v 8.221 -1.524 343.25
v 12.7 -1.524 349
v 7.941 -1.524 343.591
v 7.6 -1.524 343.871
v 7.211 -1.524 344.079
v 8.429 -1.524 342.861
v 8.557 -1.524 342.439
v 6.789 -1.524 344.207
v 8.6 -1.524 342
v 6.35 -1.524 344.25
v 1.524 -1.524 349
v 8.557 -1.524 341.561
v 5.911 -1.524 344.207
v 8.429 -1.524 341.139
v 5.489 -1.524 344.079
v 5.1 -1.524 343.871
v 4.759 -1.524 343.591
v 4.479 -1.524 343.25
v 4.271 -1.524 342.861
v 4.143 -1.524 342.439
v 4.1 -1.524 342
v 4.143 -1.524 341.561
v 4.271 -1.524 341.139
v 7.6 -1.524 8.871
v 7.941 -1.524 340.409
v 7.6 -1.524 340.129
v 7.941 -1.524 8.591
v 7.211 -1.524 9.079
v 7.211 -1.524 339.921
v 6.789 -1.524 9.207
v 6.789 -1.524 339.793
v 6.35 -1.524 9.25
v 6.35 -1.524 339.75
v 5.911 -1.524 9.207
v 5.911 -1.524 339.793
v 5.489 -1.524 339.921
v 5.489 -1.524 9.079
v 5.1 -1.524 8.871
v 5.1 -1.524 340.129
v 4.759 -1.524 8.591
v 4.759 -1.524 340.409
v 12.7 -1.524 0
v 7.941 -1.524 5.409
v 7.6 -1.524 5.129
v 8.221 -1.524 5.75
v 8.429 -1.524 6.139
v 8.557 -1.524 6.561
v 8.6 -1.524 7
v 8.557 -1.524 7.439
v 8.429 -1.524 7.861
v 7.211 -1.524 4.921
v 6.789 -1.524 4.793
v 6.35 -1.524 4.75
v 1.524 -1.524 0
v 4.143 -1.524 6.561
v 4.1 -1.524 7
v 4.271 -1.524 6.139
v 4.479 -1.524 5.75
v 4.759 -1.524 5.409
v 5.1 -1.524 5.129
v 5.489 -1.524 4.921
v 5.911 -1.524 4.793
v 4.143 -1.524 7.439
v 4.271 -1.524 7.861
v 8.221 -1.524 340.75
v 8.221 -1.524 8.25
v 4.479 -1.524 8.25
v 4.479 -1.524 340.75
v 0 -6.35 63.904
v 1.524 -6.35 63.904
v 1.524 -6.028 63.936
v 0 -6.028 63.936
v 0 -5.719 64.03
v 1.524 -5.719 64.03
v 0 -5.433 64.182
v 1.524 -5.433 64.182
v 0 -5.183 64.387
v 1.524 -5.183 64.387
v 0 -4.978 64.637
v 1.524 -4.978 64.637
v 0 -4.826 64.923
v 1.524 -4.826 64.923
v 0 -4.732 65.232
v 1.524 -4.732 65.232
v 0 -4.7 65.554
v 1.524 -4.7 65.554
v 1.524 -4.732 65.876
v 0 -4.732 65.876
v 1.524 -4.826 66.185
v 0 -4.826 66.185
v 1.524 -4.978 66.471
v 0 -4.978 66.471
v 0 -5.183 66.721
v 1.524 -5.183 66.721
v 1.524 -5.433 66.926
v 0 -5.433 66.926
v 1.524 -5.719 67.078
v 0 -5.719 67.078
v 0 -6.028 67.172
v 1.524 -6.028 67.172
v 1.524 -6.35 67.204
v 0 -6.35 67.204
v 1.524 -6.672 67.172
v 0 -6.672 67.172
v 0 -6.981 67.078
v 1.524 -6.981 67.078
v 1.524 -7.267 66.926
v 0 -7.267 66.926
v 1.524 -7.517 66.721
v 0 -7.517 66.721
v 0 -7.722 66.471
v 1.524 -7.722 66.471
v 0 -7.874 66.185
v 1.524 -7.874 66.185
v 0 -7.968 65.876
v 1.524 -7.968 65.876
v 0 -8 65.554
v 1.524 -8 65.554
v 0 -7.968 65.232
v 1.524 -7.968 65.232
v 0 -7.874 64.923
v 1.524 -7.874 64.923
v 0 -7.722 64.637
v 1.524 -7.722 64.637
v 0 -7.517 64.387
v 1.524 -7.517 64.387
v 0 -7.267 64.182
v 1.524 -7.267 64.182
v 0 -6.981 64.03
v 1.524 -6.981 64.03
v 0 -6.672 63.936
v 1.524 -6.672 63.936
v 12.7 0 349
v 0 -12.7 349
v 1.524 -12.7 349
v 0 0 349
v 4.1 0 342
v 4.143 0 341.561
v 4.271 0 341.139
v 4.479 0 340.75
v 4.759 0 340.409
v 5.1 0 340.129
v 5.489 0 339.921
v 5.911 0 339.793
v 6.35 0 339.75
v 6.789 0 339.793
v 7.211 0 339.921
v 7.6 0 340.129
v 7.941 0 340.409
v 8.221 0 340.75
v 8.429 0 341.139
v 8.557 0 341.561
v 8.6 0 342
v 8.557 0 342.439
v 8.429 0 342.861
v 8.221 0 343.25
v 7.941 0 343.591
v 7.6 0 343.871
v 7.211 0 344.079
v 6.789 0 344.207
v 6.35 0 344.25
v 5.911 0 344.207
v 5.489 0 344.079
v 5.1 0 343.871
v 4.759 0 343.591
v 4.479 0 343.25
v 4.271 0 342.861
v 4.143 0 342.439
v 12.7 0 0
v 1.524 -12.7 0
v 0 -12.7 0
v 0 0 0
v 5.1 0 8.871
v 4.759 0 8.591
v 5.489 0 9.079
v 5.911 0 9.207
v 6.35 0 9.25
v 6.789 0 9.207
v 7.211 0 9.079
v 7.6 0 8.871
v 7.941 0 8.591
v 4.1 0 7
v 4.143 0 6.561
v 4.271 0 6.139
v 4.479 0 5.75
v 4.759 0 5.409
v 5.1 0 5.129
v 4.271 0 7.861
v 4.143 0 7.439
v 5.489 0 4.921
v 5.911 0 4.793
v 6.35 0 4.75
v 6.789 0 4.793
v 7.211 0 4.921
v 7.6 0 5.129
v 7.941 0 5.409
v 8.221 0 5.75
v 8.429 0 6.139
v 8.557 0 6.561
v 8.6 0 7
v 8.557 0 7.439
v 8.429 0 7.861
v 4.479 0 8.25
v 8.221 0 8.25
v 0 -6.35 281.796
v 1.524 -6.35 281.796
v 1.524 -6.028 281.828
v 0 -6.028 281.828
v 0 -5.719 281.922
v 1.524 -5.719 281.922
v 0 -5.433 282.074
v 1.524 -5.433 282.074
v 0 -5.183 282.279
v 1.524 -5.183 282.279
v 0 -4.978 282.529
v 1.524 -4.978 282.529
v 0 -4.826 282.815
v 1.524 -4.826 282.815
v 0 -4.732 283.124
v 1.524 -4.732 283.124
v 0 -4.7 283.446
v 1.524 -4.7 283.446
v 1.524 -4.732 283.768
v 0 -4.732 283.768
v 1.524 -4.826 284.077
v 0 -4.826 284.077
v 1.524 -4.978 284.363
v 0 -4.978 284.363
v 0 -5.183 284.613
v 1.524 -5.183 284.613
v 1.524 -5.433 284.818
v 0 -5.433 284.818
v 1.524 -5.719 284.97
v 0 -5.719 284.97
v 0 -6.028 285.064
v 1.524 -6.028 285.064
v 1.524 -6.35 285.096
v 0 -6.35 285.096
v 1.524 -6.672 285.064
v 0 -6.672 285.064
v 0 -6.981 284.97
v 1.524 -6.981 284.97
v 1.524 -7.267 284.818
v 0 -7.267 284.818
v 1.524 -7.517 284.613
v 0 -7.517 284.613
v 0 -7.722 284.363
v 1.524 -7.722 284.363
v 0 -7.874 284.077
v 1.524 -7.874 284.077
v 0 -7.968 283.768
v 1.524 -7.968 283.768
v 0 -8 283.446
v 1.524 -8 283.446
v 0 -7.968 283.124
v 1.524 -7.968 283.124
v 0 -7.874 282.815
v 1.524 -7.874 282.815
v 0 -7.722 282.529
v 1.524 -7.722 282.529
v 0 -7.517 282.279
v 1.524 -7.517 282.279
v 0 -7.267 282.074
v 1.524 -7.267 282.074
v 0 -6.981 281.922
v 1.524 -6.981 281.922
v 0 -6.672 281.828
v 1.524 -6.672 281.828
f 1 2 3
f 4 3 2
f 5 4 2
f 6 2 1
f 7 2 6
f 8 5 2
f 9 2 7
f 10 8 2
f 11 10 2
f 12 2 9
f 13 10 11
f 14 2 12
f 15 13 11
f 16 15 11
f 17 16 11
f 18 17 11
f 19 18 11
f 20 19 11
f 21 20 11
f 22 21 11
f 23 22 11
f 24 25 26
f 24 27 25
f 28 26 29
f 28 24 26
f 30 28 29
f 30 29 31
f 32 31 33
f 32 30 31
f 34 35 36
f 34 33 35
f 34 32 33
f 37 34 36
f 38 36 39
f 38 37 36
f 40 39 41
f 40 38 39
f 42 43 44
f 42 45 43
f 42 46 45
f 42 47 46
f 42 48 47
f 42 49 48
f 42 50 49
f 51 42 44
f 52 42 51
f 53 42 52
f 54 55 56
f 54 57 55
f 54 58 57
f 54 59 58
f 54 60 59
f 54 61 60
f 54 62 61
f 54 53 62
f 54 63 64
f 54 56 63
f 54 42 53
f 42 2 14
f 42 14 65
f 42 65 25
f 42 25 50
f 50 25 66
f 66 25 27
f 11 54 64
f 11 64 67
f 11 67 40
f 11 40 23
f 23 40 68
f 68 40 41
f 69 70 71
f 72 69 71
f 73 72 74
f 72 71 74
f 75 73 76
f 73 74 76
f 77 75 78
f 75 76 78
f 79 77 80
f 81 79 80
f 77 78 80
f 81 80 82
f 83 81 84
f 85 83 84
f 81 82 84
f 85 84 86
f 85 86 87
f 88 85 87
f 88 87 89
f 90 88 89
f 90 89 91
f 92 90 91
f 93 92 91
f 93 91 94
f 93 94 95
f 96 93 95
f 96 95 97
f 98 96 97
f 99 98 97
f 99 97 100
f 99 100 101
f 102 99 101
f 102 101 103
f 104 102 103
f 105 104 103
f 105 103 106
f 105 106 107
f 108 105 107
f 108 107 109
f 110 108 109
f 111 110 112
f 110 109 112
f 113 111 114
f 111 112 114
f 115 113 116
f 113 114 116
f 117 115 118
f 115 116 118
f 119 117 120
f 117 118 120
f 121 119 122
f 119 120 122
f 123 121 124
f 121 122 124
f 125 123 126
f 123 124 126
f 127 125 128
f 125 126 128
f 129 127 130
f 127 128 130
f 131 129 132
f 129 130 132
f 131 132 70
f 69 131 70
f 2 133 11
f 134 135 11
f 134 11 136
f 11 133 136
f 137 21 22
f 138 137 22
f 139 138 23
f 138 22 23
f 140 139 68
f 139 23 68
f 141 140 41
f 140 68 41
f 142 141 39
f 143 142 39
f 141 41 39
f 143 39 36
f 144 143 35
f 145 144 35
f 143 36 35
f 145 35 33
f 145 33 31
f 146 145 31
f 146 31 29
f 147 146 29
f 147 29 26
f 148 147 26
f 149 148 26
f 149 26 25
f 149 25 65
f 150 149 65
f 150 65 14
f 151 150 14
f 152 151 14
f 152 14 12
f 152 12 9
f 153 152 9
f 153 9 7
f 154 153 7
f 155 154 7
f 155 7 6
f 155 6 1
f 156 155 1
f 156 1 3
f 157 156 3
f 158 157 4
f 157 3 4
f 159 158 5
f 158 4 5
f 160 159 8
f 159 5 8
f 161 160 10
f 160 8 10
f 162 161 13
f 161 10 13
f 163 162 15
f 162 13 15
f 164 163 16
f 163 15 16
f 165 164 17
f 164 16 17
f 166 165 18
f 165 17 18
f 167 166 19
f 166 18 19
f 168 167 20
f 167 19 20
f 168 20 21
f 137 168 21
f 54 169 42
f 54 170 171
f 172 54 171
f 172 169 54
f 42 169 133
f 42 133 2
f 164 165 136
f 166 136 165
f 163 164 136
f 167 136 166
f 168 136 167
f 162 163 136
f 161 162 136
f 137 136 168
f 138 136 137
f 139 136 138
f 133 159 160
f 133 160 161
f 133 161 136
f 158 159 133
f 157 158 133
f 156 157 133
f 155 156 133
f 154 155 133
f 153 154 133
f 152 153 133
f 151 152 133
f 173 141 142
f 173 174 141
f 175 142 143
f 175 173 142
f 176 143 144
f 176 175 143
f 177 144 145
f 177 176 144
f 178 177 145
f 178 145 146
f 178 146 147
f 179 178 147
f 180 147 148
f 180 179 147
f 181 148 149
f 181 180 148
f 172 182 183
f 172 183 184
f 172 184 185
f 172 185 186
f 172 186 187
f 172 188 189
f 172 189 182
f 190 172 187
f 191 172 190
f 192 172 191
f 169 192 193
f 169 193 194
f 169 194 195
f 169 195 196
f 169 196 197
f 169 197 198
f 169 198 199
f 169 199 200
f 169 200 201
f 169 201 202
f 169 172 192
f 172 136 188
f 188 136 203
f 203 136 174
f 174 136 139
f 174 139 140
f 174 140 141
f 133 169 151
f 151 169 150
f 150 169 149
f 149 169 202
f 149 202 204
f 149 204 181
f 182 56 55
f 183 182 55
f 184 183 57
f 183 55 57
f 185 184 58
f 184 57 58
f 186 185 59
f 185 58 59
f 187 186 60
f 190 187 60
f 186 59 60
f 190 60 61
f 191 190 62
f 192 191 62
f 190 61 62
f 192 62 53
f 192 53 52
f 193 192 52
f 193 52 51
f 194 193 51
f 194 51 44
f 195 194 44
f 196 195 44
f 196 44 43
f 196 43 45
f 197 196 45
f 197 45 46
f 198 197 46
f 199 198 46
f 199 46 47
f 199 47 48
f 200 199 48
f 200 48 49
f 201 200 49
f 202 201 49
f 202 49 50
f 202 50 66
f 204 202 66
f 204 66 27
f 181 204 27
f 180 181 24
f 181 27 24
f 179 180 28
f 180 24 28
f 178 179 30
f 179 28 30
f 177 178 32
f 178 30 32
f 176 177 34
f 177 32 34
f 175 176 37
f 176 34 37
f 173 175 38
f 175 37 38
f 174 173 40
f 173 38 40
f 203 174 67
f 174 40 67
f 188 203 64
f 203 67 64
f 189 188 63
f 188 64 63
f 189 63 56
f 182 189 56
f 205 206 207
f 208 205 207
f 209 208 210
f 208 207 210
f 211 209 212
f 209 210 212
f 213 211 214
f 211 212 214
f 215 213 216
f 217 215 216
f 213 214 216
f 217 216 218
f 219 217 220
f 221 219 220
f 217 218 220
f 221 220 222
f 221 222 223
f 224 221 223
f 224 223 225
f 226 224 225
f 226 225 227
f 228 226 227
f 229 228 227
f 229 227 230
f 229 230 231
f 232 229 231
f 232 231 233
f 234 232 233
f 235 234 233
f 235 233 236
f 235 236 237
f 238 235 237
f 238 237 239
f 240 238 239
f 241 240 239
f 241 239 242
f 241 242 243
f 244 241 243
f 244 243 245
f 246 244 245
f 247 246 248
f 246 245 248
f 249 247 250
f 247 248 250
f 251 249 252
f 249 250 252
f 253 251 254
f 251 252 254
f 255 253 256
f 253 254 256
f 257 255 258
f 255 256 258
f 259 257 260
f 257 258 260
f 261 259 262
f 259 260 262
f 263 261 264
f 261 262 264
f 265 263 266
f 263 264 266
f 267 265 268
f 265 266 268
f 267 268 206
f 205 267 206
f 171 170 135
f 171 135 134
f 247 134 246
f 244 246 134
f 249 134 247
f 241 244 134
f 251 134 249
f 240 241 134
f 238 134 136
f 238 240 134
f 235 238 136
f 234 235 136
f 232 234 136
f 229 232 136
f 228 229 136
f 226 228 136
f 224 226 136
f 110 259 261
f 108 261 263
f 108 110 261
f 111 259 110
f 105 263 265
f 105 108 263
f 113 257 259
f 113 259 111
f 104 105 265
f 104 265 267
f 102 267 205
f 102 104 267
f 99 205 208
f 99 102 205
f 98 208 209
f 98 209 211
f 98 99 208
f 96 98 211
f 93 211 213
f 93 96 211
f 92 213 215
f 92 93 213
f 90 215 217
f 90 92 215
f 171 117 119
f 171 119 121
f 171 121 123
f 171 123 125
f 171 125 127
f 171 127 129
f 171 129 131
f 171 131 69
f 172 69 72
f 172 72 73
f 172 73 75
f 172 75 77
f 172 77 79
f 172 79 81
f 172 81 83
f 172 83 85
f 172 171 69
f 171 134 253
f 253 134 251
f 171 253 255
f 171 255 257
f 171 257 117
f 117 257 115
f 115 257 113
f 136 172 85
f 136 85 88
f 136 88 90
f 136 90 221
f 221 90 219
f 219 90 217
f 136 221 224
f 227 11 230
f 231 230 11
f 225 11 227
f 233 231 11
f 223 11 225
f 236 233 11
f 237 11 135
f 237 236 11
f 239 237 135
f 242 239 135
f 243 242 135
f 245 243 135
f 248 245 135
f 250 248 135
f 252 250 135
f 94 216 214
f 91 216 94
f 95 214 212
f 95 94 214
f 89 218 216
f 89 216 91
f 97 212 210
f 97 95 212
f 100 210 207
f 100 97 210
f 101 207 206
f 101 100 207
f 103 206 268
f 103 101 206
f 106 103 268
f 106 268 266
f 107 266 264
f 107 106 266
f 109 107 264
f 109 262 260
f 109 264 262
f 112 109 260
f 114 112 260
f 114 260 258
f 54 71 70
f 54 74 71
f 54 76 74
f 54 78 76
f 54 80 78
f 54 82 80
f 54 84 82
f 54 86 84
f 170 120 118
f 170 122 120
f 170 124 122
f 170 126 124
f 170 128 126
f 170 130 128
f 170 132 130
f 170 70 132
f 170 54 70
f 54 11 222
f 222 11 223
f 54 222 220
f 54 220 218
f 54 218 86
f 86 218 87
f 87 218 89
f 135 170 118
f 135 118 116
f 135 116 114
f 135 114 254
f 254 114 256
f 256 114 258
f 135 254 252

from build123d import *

# Parameters (mm, degrees)
BOSS_EXTRUDE1_DEPTH   = 349
M4_CLEARANCE_HOLE1_D  = 4.5
M4X0_7_TAPPED_HOLE1_D = 3.3


with BuildPart() as part:
    # Sketch1 → Boss-Extrude1 (new body)
    with BuildSketch(Plane.XY):
        Polygon((0, 0), (12.7, 0), (12.7, -1.524), (1.524, -1.524), (1.524, -12.7), (0, -12.7), align=None)
    extrude(amount=BOSS_EXTRUDE1_DEPTH)

    # M4 Clearance Hole1 (through all)
    with Locations(Plane(origin=(0, 0, 0), x_dir=(1, 0, 0), z_dir=(0, 1, 0))):
        with Locations((6.35, -7), (6.35, -342)):
            Hole(M4_CLEARANCE_HOLE1_D / 2)

    # M4x0.7 Tapped Hole1 (through all)
    with Locations(Plane.ZY):
        with Locations((65.553973, -6.35), (283.446027, -6.35)):
            Hole(M4X0_7_TAPPED_HOLE1_D / 2)


solid = part.part
